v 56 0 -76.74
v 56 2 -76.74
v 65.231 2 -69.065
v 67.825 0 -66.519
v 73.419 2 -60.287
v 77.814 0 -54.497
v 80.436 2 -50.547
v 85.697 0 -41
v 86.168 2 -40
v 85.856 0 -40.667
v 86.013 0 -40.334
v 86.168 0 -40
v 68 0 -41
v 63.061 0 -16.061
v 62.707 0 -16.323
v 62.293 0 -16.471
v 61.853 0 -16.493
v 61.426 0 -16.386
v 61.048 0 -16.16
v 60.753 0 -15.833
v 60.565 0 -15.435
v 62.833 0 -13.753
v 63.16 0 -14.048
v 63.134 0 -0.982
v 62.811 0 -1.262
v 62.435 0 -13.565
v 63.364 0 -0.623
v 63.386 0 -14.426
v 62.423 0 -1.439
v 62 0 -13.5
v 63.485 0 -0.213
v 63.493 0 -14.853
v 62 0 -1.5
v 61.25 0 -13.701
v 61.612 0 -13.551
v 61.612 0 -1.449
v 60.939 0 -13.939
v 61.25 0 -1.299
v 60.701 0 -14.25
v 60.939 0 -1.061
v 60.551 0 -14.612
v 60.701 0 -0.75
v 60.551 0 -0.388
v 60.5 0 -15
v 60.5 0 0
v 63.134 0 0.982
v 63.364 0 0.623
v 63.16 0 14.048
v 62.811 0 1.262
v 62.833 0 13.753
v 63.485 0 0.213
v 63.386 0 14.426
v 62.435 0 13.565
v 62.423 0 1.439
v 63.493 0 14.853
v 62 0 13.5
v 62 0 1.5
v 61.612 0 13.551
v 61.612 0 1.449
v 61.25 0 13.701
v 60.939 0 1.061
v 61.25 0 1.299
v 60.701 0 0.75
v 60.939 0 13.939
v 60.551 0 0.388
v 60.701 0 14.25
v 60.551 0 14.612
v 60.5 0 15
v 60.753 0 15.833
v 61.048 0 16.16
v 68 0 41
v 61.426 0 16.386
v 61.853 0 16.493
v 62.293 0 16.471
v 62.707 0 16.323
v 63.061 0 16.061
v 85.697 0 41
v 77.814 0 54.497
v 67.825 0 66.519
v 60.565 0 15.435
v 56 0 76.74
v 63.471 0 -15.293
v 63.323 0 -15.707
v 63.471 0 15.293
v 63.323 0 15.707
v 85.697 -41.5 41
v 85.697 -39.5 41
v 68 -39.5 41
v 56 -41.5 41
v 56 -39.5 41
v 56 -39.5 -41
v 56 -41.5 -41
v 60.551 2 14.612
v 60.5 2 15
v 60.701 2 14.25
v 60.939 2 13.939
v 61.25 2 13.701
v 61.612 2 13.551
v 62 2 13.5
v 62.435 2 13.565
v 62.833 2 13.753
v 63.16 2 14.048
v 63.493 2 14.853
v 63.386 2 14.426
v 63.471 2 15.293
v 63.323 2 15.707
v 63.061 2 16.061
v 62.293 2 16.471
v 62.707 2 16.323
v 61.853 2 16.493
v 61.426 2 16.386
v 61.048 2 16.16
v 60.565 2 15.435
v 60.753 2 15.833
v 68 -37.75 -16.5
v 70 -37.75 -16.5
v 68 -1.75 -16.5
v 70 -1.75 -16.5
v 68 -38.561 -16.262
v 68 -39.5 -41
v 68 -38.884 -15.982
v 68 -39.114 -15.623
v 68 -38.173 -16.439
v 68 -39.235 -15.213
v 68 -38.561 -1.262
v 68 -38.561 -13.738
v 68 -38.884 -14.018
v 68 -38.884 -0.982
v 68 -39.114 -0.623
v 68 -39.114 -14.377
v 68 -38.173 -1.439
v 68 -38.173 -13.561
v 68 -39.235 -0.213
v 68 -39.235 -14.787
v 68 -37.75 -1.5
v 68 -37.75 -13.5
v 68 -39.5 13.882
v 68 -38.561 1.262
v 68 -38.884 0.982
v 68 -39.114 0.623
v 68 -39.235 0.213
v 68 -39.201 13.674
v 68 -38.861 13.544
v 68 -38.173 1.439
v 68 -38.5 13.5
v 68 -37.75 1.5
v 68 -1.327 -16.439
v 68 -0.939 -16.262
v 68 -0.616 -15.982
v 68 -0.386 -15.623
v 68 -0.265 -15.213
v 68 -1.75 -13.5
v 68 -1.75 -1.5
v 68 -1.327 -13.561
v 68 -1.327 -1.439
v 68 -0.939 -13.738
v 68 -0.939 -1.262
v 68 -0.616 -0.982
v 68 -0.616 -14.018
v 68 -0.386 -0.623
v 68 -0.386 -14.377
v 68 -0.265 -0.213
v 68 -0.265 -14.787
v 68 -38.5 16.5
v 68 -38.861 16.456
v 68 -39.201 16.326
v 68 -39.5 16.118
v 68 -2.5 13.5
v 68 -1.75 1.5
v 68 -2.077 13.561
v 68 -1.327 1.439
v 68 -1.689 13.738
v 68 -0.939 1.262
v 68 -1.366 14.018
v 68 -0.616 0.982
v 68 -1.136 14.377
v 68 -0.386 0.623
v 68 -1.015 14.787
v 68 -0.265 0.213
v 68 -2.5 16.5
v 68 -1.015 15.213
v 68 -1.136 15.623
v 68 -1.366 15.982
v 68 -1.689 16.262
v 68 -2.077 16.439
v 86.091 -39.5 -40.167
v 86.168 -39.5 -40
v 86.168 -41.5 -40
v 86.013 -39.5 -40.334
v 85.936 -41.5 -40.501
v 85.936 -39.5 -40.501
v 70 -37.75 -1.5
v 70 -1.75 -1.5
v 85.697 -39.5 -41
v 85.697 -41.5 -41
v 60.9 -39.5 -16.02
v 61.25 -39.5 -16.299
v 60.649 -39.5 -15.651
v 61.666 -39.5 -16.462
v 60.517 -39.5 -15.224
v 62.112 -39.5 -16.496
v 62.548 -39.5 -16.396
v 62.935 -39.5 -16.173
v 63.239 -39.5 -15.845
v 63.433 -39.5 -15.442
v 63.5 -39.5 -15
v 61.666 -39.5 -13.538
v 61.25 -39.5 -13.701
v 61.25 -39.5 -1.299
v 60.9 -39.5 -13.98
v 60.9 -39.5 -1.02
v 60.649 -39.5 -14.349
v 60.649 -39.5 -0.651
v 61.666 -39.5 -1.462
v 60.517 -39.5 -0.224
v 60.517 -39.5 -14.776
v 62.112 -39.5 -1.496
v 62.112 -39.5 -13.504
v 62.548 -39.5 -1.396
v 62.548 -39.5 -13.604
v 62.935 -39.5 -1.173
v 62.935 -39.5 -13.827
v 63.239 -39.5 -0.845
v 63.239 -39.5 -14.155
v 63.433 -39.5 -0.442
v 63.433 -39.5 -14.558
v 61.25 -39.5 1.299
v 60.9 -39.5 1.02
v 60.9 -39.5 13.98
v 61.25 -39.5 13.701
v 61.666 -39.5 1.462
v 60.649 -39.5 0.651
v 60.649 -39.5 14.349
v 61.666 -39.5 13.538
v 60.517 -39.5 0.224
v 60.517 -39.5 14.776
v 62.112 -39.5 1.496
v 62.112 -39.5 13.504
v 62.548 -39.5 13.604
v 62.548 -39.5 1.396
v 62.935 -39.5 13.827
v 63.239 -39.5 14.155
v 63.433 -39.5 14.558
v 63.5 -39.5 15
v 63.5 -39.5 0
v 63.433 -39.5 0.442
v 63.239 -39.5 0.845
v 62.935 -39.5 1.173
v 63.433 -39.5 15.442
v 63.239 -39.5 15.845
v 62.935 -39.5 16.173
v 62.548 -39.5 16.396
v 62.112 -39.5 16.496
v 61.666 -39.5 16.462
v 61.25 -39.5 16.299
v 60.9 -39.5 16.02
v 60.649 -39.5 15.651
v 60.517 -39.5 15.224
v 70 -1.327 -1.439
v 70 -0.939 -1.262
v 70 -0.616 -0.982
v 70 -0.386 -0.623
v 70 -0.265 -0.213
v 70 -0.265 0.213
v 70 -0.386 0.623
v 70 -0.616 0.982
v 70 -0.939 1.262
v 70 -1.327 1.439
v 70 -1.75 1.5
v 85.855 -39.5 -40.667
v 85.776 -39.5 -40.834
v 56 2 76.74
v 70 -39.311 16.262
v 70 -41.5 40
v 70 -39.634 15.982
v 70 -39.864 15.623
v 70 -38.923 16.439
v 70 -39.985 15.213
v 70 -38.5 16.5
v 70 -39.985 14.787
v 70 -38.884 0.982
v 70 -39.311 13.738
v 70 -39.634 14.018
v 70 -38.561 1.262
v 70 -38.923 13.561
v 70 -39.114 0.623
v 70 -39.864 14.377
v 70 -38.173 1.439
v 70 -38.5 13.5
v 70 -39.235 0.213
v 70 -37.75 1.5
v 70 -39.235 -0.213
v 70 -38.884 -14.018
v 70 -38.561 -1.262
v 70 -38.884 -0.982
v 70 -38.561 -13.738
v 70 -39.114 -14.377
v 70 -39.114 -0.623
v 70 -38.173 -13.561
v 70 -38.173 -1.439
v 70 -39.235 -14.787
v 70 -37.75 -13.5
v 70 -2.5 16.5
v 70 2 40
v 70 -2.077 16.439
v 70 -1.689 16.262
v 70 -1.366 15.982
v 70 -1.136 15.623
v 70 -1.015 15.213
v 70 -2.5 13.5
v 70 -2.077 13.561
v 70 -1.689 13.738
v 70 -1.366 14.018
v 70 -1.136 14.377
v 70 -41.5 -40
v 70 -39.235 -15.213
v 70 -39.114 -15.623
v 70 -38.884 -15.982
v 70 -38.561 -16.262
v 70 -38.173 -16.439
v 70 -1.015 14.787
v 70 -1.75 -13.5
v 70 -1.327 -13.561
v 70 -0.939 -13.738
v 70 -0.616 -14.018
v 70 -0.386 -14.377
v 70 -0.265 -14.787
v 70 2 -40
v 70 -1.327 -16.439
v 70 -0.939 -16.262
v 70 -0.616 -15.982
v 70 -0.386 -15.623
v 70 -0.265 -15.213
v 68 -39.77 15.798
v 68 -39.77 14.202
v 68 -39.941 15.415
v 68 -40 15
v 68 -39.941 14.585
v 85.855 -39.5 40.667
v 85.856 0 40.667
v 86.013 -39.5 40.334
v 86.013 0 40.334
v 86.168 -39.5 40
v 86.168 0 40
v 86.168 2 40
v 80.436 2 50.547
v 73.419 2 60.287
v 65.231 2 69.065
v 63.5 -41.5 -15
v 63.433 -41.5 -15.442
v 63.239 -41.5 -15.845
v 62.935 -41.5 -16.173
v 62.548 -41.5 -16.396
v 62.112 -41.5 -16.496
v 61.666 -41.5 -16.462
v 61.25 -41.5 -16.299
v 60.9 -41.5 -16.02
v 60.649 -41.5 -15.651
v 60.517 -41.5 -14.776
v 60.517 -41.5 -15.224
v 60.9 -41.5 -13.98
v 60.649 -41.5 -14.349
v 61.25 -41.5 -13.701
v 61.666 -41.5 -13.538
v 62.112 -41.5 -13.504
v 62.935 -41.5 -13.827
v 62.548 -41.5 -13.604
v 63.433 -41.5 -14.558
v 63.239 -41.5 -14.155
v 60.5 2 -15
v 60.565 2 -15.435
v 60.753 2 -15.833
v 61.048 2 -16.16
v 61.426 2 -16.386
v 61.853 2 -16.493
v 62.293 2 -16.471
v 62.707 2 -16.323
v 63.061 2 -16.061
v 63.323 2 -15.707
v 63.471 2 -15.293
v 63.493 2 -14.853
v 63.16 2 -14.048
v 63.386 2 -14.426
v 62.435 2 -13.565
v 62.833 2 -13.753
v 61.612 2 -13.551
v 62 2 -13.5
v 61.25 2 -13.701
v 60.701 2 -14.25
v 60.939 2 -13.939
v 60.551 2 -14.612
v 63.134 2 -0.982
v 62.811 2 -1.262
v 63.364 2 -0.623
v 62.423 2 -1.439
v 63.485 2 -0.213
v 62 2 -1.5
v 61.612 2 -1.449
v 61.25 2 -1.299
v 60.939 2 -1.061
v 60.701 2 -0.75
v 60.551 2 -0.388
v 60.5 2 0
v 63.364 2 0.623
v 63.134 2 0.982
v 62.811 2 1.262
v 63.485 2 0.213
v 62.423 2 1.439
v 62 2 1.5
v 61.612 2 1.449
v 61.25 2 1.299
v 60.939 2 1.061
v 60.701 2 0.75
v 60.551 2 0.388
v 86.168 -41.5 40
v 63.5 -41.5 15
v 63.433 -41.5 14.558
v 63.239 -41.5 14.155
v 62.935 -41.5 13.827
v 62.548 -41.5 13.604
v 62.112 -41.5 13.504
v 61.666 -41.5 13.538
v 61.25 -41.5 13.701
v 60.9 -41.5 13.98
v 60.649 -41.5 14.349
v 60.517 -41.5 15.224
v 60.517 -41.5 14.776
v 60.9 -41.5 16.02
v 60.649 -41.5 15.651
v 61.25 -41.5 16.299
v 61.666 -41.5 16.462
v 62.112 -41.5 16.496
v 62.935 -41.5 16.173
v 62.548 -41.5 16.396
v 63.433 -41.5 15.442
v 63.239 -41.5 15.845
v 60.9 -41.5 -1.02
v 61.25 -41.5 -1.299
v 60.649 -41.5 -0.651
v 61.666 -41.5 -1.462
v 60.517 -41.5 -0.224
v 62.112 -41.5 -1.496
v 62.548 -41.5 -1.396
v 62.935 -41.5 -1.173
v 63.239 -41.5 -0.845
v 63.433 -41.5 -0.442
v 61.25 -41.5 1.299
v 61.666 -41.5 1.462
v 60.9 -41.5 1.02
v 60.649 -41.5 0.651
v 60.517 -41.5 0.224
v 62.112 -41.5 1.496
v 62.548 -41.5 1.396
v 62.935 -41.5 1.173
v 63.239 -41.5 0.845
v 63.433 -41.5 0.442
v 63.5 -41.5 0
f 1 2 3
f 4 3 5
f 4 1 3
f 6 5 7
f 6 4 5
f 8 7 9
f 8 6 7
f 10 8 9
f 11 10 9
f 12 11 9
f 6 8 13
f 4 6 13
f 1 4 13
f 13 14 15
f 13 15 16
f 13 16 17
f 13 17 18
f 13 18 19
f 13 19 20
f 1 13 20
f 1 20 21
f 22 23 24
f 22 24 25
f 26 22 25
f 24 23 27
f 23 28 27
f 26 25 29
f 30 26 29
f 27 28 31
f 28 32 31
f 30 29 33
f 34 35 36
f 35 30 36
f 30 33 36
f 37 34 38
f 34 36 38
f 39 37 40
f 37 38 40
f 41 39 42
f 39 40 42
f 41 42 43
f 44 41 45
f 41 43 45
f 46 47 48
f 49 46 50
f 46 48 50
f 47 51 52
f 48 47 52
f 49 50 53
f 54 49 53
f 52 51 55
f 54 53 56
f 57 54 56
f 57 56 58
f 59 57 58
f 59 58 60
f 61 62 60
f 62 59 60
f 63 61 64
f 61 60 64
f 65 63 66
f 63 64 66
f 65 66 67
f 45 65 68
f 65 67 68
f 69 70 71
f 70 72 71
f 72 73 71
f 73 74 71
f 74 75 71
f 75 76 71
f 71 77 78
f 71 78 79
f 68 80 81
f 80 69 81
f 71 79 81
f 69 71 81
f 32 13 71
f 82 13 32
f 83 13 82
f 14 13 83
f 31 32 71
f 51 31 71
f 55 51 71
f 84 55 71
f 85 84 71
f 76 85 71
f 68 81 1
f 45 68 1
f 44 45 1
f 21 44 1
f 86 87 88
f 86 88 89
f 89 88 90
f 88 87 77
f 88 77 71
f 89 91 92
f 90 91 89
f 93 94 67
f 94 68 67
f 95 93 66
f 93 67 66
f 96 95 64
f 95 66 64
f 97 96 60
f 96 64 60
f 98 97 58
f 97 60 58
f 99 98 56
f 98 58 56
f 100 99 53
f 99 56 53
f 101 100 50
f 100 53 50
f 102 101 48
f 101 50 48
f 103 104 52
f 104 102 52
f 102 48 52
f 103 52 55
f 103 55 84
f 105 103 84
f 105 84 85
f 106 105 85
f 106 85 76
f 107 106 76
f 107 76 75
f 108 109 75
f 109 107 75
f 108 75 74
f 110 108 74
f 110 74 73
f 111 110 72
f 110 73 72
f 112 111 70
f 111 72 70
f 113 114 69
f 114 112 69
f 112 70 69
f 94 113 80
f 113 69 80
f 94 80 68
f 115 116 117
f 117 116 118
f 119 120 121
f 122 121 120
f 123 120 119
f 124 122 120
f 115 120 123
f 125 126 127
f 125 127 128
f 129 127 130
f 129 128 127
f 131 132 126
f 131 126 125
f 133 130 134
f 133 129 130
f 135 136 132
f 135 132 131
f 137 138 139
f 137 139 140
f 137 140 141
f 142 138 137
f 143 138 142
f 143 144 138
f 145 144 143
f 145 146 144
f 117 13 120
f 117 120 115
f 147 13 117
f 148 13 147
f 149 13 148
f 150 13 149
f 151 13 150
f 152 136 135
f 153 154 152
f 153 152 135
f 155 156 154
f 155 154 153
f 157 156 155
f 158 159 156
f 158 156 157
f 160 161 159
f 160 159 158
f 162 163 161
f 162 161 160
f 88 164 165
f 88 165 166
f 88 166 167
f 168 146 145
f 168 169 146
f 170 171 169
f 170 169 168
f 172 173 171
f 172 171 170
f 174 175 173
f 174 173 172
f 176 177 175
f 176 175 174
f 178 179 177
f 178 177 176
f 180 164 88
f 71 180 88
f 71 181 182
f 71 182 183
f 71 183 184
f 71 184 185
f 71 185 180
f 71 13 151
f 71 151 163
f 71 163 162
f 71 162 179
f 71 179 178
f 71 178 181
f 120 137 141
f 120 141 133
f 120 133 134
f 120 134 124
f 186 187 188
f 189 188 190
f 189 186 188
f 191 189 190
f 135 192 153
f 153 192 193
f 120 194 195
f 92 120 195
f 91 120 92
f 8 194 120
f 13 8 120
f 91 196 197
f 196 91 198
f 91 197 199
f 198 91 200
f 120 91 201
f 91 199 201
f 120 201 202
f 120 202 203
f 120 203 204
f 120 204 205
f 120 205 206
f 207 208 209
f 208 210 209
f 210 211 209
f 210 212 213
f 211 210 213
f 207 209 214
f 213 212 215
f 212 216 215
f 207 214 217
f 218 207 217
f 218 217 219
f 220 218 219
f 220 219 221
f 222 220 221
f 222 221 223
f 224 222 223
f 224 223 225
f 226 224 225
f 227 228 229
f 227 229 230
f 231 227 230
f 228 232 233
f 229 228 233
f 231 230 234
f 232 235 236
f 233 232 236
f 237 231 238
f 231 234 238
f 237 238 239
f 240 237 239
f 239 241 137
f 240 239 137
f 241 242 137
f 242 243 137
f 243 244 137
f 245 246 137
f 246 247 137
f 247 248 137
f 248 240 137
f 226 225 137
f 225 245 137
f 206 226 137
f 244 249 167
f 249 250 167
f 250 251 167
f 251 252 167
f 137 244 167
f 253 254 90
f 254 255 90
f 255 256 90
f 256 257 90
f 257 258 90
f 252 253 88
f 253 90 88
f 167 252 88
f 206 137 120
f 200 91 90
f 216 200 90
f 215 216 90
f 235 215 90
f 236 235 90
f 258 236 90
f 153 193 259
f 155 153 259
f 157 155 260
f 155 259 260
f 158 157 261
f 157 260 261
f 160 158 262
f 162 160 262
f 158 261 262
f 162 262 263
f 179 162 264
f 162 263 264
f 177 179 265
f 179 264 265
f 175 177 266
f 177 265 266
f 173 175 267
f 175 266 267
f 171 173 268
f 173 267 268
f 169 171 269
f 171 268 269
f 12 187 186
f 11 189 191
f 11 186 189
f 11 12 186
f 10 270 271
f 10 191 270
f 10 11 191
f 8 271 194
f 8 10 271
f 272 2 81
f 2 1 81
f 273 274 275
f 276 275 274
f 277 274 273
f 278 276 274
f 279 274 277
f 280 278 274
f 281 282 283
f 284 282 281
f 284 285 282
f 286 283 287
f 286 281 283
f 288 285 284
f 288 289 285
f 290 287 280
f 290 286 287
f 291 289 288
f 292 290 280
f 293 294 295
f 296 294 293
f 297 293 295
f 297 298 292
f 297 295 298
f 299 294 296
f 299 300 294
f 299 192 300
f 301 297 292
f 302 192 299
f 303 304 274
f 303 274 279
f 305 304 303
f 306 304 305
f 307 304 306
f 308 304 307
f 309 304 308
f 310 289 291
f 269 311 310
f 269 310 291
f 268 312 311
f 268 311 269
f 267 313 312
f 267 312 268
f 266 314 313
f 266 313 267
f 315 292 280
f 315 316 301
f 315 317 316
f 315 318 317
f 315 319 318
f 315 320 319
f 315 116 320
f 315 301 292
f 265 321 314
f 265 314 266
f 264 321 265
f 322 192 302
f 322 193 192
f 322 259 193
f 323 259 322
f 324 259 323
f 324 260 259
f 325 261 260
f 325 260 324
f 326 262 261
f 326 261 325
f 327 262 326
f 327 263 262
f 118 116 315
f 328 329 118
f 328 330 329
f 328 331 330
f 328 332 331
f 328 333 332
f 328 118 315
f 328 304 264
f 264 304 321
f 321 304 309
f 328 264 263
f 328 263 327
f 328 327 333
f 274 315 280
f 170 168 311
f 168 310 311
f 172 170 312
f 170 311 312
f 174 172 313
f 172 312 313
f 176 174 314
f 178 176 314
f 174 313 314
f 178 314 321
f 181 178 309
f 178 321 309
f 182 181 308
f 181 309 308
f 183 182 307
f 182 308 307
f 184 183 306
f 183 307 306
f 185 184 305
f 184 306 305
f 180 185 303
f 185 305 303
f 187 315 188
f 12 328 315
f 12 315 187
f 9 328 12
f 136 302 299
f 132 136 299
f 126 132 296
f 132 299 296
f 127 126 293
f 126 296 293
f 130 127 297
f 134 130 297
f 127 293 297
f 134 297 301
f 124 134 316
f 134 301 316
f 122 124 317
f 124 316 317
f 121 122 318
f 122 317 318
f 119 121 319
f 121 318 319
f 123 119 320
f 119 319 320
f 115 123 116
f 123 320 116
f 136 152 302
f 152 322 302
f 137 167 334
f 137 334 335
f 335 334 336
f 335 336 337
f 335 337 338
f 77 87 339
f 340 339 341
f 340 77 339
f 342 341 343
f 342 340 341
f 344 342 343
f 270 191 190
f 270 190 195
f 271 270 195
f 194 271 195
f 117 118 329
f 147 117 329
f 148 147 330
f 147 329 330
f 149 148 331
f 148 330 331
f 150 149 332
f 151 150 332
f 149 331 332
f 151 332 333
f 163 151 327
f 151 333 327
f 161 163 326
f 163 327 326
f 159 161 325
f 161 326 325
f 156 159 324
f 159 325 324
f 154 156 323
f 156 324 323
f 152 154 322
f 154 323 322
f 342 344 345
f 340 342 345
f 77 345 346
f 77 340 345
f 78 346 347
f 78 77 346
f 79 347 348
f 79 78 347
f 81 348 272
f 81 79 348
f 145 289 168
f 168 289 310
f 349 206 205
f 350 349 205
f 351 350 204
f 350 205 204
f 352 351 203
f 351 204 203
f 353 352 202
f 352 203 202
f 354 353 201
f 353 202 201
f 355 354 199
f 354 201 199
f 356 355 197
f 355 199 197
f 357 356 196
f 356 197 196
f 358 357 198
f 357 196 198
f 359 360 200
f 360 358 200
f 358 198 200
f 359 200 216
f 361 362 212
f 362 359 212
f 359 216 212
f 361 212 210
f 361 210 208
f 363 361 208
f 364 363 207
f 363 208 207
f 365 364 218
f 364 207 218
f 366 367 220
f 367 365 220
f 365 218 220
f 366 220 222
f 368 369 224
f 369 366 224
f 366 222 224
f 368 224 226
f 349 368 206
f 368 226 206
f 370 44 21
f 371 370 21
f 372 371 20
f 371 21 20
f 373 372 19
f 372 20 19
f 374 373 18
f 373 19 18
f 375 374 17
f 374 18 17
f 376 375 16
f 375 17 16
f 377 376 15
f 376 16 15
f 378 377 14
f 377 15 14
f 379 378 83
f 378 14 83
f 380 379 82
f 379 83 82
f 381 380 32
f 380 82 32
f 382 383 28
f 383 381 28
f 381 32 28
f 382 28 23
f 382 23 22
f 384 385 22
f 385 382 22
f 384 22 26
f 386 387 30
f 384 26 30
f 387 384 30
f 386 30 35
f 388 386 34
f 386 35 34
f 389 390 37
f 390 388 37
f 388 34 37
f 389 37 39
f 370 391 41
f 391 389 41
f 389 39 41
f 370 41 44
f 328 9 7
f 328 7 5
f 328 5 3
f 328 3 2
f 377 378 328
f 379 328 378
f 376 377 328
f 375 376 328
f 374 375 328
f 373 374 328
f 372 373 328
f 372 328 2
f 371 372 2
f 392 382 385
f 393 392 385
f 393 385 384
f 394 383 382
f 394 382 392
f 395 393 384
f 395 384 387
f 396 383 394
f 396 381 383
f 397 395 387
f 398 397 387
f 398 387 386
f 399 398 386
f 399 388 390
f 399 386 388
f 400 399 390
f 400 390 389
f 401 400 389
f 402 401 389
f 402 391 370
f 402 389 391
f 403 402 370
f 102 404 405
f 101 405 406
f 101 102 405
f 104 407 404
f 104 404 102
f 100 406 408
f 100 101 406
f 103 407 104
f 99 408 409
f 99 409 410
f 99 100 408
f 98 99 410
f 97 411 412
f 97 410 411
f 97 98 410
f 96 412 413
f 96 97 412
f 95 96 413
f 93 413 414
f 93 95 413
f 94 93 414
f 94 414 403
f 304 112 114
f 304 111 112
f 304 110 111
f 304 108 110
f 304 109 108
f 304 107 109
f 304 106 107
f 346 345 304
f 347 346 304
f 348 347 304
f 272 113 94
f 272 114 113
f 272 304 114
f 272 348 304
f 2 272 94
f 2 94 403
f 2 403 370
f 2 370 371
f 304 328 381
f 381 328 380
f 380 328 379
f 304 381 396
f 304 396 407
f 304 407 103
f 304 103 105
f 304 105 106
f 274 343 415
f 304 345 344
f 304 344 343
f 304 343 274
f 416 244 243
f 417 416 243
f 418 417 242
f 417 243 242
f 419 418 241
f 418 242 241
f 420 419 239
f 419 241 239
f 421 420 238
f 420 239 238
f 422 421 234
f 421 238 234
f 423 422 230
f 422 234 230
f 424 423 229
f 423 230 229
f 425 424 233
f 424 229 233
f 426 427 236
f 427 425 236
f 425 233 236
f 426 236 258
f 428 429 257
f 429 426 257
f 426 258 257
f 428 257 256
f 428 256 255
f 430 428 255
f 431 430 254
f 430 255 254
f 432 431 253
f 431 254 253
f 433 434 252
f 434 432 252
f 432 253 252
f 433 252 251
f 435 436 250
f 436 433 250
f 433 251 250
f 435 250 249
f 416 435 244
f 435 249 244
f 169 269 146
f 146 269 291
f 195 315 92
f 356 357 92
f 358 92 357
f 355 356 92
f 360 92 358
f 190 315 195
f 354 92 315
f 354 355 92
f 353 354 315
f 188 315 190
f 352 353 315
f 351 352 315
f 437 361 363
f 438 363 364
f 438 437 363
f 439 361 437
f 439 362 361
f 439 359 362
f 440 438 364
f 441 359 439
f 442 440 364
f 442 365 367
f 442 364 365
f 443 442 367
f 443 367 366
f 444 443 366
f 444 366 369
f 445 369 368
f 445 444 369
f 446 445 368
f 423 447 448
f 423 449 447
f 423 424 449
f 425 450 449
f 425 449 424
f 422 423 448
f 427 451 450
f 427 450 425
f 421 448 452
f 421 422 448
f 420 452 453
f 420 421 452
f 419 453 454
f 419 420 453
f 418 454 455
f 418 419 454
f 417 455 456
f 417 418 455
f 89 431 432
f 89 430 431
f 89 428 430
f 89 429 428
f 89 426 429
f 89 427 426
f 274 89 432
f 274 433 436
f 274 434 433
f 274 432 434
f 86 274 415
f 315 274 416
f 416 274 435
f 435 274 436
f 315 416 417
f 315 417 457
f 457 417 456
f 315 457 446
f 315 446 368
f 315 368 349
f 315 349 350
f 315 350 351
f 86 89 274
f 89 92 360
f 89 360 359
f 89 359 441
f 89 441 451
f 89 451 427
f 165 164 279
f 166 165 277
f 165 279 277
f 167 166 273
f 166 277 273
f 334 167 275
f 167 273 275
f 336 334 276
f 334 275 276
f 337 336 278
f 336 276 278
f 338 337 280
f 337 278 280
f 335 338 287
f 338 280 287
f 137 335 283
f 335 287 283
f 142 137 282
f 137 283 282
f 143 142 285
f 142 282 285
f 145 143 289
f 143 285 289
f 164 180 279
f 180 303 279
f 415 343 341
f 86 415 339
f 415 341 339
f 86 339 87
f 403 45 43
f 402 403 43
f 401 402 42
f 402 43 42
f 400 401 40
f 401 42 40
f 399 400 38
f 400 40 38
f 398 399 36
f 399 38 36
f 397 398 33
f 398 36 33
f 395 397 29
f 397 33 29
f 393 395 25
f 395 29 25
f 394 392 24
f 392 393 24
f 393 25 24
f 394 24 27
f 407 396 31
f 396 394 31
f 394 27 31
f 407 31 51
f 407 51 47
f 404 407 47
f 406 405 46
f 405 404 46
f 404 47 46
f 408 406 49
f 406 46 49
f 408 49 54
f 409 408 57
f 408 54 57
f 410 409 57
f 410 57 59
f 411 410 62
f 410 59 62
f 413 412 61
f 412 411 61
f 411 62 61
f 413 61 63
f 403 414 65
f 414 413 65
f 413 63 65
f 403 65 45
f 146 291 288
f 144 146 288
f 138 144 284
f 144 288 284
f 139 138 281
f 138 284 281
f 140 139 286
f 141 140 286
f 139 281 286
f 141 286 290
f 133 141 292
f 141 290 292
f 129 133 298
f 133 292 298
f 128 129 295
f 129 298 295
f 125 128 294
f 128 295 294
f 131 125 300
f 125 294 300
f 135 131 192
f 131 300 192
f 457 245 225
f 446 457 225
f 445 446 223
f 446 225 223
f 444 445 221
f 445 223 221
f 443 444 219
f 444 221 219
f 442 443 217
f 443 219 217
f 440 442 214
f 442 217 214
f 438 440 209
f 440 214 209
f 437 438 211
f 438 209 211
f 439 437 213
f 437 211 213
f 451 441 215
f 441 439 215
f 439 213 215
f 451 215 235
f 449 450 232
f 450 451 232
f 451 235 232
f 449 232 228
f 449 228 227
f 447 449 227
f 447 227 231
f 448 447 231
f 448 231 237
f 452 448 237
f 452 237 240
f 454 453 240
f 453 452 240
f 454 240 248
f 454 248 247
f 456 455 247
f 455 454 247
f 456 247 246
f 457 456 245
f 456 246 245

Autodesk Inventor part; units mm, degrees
ref_plane "YZ Plane" through (0, 0, 0) normal (1, 0, 0) x (0, 1, 0)
ref_plane "XZ Plane" through (0, 0, 0) normal (0, 1, 0) x (-1, 0, 0)
ref_plane "XY Plane" through (0, 0, 0) normal (0, 0, 1) x (1, 0, 0)
sketch "Sketch3" plane through (0, 0, 0) normal (0, 1, 0) x (-1, 0, 0)
  circle A0 centre (0, 0) radius 95
  line L0 (-68, 0) -> (-68, -40)
  line L1 (-68, 0) -> (-68, 40)
  line L2 (-68, 40) -> (-86.1684, 40)
  line L3 (-68, -40) -> (-86.1684, -40)
  line L4 (-56, 0) -> (-56, -76.7398)
  line L5 (-56, 0) -> (-56, 76.7398)
  line L6 (-62, 0) -> (-62, -15)
  line L7 (-62, 0) -> (-62, 15)
  circle A1 centre (-62, 15) radius 1.5
  circle A2 centre (-62, 0) radius 1.5
  circle A3 centre (-62, -15) radius 1.5
  line L8 (-68, 0) -> (-70, 0)
  line L9 (-70, 0) -> (-70, -40)
  line L10 (-70, 0) -> (-70, 40)
  dimension "d1" = 68
  dimension "d2" = 40
  dimension "d3" = 40
  dimension "d4" = 12
  dimension "d5" = 6
  dimension "d6" = 15
  dimension "d7" = 15
  dimension "d8" = 3
  dimension "d9" = 3
  dimension "d10" = 3
  dimension "d11" = 2
extrude "Extrusion1" add sketch "Sketch3" along normal blind 2 contours L5 L4 A0 L3 L0 L1 L2 | L2 L1 L8 L10 | L9 L8 L0 L3
sketch "Sketch4" plane through (0, 0, 0) normal (0, -1, 0) x (1, 0, 0)
  line L0 (70, 40) -> (70, -40) projected
  line L1 (70, 0) -> (68, 0)
  line L2 (68, 0) -> (68, -40)
  line L3 (70, -41) -> (85.6971, -41)
  arc A0 (56, -76.7398) -> (86.1684, -40) centre (0, 0) ccw projected
  line L4 (68, -40) -> (68, -41)
  line L5 (70, -41) -> (68, -41)
  line L6 (85.6971, -41) -> (86.1684, -40)
  line L7 (70, -40) -> (86.1684, -40) projected
  line L8 (70, -40) -> (86.1684, -40)
  line L9 (70, -40) -> (70, 40)
  line L10 (86.1684, 40) -> (70, 40) projected
  line L11 (86.1684, 40) -> (70, 40)
  line L12 (68, 0) -> (68, 40)
  line L13 (70, 41) -> (85.6971, 41)
  arc A1 (86.1684, 40) -> (56, 76.7398) centre (0, 0) ccw projected
  line L14 (70, 41) -> (68, 41)
  line L15 (68, 40) -> (68, 41)
  line L16 (85.6971, 41) -> (86.1684, 40)
  dimension "d14" = 2
  dimension "d15" = 1
extrude "Extrusion2" add sketch "Sketch4" along normal blind 39.5
sketch "Sketch5" plane through (0, -39.5, 0) normal (0, -1, 0) x (1, 0, 0)
  point P0 (0, 0)
sketch "Sketch6" plane through (0, -39.5, 0) normal (0, -1, 0) x (1, 0, 0)
  circle A0 centre (62, 15) radius 1.5 projected
  circle A1 centre (62, 15) radius 1.5
  circle A2 centre (62, 0) radius 1.5
  circle A3 centre (62, -15) radius 1.5 projected
  circle A4 centre (62, -15) radius 1.5
  line L0 (70, 40) -> (56, 40)
  line L1 (70, -40) -> (86.1684, -40) projected
  line L2 (70, -40) -> (56, -40)
  line L3 (56, -40) -> (56, 40)
  line L4 (70, 40) -> (70, -40) projected
  line L5 (70, 40) -> (70, -40)
  line L6 (86.1684, 40) -> (70, 40) projected
  line L7 (86.1684, 40) -> (70, 40)
  line L8 (70, -40) -> (86.1684, -40)
  line L9 (86.1684, 40) -> (85.6971, 41)
  arc A5 (86.1684, 40) -> (85.6971, 41) centre (0, 0) ccw projected
  line L10 (56, 40) -> (56, 41)
  line L11 (85.6971, 41) -> (56, 41)
  line L12 (56, -40) -> (56, -41)
  line L13 (86.1684, -40) -> (85.9357, -40.5014)
  line L14 (85.6971, -41) -> (56, -41)
  line L15 (85.9357, -40.5014) -> (85.6971, -41)
  arc A6 (56, -76.7398) -> (86.1684, -40) centre (0, 0) ccw projected
extrude "Extrusion3" add sketch "Sketch6" along normal blind 2 contours L4 L2 L3 L0
extrude "Extrusion5" add sketch "Sketch6" along normal blind 2 contours L0 L10 L11 L9 L6 | L1 L13 L15 L14 L12 L2
sketch "Sketch7" plane through (70, 2, 40) normal (1, 0, 0) x (0, 0, -1)
  line L0 (0, -2) -> (0, -43.5) projected
  line L1 (80, -2) -> (80, -41.5) projected
  line L2 (80, -21.75) -> (55, -21.75)
  line L3 (55, -21.75) -> (40, -21.75)
  line L4 (40, -21.75) -> (40, -3.75)
  line L5 (40, -21.75) -> (40, -39.75)
  line L6 (55, -21.75) -> (55, -3.75)
  line L7 (55, -21.75) -> (55, -39.75)
  line L8 (0, 0) -> (80, 0) projected
  line L9 (0, -22.5) -> (25, -22.5)
  line L10 (25, -22.5) -> (25, -4.5)
  line L11 (25, -22.5) -> (25, -40.5)
  line L12 (25, -4.5) -> (25, -40.5) construction
  line L13 (23.5, -4.5) -> (23.5, -40.5)
  line L14 (26.5, -40.5) -> (26.5, -4.5)
  arc A0 (26.5, -4.5) -> (23.5, -4.5) centre (25, -4.5) ccw
  arc A1 (23.5, -40.5) -> (26.5, -40.5) centre (25, -40.5) ccw
  line L15 (40, -3.75) -> (40, -39.75) construction
  line L16 (38.5, -3.75) -> (38.5, -39.75)
  line L17 (41.5, -39.75) -> (41.5, -3.75)
  arc A2 (41.5, -3.75) -> (38.5, -3.75) centre (40, -3.75) ccw
  arc A3 (38.5, -39.75) -> (41.5, -39.75) centre (40, -39.75) ccw
  line L18 (55, -39.75) -> (55, -3.75) construction
  line L19 (56.5, -39.75) -> (56.5, -3.75)
  line L20 (53.5, -3.75) -> (53.5, -39.75)
  arc A4 (53.5, -39.75) -> (56.5, -39.75) centre (55, -39.75) ccw
  arc A5 (56.5, -3.75) -> (53.5, -3.75) centre (55, -3.75) ccw
  point P0 (40, -2)
  point P1 (40, -21.75)
  dimension "d26" = 25
  dimension "d27" = 15
  dimension "d28" = 18
  dimension "d29" = 18
  dimension "d30" = 18
  dimension "d31" = 18
  dimension "d35" = 21.75
  dimension "d36" = 25
  dimension "d37" = 18
  dimension "d38" = 18
  dimension "d39" = 3
  dimension "d40" = 3
  dimension "d41" = 3
extrude "Extrusion6" cut sketch "Sketch7" against normal blind 2
properties part number "Base-Dribler"
